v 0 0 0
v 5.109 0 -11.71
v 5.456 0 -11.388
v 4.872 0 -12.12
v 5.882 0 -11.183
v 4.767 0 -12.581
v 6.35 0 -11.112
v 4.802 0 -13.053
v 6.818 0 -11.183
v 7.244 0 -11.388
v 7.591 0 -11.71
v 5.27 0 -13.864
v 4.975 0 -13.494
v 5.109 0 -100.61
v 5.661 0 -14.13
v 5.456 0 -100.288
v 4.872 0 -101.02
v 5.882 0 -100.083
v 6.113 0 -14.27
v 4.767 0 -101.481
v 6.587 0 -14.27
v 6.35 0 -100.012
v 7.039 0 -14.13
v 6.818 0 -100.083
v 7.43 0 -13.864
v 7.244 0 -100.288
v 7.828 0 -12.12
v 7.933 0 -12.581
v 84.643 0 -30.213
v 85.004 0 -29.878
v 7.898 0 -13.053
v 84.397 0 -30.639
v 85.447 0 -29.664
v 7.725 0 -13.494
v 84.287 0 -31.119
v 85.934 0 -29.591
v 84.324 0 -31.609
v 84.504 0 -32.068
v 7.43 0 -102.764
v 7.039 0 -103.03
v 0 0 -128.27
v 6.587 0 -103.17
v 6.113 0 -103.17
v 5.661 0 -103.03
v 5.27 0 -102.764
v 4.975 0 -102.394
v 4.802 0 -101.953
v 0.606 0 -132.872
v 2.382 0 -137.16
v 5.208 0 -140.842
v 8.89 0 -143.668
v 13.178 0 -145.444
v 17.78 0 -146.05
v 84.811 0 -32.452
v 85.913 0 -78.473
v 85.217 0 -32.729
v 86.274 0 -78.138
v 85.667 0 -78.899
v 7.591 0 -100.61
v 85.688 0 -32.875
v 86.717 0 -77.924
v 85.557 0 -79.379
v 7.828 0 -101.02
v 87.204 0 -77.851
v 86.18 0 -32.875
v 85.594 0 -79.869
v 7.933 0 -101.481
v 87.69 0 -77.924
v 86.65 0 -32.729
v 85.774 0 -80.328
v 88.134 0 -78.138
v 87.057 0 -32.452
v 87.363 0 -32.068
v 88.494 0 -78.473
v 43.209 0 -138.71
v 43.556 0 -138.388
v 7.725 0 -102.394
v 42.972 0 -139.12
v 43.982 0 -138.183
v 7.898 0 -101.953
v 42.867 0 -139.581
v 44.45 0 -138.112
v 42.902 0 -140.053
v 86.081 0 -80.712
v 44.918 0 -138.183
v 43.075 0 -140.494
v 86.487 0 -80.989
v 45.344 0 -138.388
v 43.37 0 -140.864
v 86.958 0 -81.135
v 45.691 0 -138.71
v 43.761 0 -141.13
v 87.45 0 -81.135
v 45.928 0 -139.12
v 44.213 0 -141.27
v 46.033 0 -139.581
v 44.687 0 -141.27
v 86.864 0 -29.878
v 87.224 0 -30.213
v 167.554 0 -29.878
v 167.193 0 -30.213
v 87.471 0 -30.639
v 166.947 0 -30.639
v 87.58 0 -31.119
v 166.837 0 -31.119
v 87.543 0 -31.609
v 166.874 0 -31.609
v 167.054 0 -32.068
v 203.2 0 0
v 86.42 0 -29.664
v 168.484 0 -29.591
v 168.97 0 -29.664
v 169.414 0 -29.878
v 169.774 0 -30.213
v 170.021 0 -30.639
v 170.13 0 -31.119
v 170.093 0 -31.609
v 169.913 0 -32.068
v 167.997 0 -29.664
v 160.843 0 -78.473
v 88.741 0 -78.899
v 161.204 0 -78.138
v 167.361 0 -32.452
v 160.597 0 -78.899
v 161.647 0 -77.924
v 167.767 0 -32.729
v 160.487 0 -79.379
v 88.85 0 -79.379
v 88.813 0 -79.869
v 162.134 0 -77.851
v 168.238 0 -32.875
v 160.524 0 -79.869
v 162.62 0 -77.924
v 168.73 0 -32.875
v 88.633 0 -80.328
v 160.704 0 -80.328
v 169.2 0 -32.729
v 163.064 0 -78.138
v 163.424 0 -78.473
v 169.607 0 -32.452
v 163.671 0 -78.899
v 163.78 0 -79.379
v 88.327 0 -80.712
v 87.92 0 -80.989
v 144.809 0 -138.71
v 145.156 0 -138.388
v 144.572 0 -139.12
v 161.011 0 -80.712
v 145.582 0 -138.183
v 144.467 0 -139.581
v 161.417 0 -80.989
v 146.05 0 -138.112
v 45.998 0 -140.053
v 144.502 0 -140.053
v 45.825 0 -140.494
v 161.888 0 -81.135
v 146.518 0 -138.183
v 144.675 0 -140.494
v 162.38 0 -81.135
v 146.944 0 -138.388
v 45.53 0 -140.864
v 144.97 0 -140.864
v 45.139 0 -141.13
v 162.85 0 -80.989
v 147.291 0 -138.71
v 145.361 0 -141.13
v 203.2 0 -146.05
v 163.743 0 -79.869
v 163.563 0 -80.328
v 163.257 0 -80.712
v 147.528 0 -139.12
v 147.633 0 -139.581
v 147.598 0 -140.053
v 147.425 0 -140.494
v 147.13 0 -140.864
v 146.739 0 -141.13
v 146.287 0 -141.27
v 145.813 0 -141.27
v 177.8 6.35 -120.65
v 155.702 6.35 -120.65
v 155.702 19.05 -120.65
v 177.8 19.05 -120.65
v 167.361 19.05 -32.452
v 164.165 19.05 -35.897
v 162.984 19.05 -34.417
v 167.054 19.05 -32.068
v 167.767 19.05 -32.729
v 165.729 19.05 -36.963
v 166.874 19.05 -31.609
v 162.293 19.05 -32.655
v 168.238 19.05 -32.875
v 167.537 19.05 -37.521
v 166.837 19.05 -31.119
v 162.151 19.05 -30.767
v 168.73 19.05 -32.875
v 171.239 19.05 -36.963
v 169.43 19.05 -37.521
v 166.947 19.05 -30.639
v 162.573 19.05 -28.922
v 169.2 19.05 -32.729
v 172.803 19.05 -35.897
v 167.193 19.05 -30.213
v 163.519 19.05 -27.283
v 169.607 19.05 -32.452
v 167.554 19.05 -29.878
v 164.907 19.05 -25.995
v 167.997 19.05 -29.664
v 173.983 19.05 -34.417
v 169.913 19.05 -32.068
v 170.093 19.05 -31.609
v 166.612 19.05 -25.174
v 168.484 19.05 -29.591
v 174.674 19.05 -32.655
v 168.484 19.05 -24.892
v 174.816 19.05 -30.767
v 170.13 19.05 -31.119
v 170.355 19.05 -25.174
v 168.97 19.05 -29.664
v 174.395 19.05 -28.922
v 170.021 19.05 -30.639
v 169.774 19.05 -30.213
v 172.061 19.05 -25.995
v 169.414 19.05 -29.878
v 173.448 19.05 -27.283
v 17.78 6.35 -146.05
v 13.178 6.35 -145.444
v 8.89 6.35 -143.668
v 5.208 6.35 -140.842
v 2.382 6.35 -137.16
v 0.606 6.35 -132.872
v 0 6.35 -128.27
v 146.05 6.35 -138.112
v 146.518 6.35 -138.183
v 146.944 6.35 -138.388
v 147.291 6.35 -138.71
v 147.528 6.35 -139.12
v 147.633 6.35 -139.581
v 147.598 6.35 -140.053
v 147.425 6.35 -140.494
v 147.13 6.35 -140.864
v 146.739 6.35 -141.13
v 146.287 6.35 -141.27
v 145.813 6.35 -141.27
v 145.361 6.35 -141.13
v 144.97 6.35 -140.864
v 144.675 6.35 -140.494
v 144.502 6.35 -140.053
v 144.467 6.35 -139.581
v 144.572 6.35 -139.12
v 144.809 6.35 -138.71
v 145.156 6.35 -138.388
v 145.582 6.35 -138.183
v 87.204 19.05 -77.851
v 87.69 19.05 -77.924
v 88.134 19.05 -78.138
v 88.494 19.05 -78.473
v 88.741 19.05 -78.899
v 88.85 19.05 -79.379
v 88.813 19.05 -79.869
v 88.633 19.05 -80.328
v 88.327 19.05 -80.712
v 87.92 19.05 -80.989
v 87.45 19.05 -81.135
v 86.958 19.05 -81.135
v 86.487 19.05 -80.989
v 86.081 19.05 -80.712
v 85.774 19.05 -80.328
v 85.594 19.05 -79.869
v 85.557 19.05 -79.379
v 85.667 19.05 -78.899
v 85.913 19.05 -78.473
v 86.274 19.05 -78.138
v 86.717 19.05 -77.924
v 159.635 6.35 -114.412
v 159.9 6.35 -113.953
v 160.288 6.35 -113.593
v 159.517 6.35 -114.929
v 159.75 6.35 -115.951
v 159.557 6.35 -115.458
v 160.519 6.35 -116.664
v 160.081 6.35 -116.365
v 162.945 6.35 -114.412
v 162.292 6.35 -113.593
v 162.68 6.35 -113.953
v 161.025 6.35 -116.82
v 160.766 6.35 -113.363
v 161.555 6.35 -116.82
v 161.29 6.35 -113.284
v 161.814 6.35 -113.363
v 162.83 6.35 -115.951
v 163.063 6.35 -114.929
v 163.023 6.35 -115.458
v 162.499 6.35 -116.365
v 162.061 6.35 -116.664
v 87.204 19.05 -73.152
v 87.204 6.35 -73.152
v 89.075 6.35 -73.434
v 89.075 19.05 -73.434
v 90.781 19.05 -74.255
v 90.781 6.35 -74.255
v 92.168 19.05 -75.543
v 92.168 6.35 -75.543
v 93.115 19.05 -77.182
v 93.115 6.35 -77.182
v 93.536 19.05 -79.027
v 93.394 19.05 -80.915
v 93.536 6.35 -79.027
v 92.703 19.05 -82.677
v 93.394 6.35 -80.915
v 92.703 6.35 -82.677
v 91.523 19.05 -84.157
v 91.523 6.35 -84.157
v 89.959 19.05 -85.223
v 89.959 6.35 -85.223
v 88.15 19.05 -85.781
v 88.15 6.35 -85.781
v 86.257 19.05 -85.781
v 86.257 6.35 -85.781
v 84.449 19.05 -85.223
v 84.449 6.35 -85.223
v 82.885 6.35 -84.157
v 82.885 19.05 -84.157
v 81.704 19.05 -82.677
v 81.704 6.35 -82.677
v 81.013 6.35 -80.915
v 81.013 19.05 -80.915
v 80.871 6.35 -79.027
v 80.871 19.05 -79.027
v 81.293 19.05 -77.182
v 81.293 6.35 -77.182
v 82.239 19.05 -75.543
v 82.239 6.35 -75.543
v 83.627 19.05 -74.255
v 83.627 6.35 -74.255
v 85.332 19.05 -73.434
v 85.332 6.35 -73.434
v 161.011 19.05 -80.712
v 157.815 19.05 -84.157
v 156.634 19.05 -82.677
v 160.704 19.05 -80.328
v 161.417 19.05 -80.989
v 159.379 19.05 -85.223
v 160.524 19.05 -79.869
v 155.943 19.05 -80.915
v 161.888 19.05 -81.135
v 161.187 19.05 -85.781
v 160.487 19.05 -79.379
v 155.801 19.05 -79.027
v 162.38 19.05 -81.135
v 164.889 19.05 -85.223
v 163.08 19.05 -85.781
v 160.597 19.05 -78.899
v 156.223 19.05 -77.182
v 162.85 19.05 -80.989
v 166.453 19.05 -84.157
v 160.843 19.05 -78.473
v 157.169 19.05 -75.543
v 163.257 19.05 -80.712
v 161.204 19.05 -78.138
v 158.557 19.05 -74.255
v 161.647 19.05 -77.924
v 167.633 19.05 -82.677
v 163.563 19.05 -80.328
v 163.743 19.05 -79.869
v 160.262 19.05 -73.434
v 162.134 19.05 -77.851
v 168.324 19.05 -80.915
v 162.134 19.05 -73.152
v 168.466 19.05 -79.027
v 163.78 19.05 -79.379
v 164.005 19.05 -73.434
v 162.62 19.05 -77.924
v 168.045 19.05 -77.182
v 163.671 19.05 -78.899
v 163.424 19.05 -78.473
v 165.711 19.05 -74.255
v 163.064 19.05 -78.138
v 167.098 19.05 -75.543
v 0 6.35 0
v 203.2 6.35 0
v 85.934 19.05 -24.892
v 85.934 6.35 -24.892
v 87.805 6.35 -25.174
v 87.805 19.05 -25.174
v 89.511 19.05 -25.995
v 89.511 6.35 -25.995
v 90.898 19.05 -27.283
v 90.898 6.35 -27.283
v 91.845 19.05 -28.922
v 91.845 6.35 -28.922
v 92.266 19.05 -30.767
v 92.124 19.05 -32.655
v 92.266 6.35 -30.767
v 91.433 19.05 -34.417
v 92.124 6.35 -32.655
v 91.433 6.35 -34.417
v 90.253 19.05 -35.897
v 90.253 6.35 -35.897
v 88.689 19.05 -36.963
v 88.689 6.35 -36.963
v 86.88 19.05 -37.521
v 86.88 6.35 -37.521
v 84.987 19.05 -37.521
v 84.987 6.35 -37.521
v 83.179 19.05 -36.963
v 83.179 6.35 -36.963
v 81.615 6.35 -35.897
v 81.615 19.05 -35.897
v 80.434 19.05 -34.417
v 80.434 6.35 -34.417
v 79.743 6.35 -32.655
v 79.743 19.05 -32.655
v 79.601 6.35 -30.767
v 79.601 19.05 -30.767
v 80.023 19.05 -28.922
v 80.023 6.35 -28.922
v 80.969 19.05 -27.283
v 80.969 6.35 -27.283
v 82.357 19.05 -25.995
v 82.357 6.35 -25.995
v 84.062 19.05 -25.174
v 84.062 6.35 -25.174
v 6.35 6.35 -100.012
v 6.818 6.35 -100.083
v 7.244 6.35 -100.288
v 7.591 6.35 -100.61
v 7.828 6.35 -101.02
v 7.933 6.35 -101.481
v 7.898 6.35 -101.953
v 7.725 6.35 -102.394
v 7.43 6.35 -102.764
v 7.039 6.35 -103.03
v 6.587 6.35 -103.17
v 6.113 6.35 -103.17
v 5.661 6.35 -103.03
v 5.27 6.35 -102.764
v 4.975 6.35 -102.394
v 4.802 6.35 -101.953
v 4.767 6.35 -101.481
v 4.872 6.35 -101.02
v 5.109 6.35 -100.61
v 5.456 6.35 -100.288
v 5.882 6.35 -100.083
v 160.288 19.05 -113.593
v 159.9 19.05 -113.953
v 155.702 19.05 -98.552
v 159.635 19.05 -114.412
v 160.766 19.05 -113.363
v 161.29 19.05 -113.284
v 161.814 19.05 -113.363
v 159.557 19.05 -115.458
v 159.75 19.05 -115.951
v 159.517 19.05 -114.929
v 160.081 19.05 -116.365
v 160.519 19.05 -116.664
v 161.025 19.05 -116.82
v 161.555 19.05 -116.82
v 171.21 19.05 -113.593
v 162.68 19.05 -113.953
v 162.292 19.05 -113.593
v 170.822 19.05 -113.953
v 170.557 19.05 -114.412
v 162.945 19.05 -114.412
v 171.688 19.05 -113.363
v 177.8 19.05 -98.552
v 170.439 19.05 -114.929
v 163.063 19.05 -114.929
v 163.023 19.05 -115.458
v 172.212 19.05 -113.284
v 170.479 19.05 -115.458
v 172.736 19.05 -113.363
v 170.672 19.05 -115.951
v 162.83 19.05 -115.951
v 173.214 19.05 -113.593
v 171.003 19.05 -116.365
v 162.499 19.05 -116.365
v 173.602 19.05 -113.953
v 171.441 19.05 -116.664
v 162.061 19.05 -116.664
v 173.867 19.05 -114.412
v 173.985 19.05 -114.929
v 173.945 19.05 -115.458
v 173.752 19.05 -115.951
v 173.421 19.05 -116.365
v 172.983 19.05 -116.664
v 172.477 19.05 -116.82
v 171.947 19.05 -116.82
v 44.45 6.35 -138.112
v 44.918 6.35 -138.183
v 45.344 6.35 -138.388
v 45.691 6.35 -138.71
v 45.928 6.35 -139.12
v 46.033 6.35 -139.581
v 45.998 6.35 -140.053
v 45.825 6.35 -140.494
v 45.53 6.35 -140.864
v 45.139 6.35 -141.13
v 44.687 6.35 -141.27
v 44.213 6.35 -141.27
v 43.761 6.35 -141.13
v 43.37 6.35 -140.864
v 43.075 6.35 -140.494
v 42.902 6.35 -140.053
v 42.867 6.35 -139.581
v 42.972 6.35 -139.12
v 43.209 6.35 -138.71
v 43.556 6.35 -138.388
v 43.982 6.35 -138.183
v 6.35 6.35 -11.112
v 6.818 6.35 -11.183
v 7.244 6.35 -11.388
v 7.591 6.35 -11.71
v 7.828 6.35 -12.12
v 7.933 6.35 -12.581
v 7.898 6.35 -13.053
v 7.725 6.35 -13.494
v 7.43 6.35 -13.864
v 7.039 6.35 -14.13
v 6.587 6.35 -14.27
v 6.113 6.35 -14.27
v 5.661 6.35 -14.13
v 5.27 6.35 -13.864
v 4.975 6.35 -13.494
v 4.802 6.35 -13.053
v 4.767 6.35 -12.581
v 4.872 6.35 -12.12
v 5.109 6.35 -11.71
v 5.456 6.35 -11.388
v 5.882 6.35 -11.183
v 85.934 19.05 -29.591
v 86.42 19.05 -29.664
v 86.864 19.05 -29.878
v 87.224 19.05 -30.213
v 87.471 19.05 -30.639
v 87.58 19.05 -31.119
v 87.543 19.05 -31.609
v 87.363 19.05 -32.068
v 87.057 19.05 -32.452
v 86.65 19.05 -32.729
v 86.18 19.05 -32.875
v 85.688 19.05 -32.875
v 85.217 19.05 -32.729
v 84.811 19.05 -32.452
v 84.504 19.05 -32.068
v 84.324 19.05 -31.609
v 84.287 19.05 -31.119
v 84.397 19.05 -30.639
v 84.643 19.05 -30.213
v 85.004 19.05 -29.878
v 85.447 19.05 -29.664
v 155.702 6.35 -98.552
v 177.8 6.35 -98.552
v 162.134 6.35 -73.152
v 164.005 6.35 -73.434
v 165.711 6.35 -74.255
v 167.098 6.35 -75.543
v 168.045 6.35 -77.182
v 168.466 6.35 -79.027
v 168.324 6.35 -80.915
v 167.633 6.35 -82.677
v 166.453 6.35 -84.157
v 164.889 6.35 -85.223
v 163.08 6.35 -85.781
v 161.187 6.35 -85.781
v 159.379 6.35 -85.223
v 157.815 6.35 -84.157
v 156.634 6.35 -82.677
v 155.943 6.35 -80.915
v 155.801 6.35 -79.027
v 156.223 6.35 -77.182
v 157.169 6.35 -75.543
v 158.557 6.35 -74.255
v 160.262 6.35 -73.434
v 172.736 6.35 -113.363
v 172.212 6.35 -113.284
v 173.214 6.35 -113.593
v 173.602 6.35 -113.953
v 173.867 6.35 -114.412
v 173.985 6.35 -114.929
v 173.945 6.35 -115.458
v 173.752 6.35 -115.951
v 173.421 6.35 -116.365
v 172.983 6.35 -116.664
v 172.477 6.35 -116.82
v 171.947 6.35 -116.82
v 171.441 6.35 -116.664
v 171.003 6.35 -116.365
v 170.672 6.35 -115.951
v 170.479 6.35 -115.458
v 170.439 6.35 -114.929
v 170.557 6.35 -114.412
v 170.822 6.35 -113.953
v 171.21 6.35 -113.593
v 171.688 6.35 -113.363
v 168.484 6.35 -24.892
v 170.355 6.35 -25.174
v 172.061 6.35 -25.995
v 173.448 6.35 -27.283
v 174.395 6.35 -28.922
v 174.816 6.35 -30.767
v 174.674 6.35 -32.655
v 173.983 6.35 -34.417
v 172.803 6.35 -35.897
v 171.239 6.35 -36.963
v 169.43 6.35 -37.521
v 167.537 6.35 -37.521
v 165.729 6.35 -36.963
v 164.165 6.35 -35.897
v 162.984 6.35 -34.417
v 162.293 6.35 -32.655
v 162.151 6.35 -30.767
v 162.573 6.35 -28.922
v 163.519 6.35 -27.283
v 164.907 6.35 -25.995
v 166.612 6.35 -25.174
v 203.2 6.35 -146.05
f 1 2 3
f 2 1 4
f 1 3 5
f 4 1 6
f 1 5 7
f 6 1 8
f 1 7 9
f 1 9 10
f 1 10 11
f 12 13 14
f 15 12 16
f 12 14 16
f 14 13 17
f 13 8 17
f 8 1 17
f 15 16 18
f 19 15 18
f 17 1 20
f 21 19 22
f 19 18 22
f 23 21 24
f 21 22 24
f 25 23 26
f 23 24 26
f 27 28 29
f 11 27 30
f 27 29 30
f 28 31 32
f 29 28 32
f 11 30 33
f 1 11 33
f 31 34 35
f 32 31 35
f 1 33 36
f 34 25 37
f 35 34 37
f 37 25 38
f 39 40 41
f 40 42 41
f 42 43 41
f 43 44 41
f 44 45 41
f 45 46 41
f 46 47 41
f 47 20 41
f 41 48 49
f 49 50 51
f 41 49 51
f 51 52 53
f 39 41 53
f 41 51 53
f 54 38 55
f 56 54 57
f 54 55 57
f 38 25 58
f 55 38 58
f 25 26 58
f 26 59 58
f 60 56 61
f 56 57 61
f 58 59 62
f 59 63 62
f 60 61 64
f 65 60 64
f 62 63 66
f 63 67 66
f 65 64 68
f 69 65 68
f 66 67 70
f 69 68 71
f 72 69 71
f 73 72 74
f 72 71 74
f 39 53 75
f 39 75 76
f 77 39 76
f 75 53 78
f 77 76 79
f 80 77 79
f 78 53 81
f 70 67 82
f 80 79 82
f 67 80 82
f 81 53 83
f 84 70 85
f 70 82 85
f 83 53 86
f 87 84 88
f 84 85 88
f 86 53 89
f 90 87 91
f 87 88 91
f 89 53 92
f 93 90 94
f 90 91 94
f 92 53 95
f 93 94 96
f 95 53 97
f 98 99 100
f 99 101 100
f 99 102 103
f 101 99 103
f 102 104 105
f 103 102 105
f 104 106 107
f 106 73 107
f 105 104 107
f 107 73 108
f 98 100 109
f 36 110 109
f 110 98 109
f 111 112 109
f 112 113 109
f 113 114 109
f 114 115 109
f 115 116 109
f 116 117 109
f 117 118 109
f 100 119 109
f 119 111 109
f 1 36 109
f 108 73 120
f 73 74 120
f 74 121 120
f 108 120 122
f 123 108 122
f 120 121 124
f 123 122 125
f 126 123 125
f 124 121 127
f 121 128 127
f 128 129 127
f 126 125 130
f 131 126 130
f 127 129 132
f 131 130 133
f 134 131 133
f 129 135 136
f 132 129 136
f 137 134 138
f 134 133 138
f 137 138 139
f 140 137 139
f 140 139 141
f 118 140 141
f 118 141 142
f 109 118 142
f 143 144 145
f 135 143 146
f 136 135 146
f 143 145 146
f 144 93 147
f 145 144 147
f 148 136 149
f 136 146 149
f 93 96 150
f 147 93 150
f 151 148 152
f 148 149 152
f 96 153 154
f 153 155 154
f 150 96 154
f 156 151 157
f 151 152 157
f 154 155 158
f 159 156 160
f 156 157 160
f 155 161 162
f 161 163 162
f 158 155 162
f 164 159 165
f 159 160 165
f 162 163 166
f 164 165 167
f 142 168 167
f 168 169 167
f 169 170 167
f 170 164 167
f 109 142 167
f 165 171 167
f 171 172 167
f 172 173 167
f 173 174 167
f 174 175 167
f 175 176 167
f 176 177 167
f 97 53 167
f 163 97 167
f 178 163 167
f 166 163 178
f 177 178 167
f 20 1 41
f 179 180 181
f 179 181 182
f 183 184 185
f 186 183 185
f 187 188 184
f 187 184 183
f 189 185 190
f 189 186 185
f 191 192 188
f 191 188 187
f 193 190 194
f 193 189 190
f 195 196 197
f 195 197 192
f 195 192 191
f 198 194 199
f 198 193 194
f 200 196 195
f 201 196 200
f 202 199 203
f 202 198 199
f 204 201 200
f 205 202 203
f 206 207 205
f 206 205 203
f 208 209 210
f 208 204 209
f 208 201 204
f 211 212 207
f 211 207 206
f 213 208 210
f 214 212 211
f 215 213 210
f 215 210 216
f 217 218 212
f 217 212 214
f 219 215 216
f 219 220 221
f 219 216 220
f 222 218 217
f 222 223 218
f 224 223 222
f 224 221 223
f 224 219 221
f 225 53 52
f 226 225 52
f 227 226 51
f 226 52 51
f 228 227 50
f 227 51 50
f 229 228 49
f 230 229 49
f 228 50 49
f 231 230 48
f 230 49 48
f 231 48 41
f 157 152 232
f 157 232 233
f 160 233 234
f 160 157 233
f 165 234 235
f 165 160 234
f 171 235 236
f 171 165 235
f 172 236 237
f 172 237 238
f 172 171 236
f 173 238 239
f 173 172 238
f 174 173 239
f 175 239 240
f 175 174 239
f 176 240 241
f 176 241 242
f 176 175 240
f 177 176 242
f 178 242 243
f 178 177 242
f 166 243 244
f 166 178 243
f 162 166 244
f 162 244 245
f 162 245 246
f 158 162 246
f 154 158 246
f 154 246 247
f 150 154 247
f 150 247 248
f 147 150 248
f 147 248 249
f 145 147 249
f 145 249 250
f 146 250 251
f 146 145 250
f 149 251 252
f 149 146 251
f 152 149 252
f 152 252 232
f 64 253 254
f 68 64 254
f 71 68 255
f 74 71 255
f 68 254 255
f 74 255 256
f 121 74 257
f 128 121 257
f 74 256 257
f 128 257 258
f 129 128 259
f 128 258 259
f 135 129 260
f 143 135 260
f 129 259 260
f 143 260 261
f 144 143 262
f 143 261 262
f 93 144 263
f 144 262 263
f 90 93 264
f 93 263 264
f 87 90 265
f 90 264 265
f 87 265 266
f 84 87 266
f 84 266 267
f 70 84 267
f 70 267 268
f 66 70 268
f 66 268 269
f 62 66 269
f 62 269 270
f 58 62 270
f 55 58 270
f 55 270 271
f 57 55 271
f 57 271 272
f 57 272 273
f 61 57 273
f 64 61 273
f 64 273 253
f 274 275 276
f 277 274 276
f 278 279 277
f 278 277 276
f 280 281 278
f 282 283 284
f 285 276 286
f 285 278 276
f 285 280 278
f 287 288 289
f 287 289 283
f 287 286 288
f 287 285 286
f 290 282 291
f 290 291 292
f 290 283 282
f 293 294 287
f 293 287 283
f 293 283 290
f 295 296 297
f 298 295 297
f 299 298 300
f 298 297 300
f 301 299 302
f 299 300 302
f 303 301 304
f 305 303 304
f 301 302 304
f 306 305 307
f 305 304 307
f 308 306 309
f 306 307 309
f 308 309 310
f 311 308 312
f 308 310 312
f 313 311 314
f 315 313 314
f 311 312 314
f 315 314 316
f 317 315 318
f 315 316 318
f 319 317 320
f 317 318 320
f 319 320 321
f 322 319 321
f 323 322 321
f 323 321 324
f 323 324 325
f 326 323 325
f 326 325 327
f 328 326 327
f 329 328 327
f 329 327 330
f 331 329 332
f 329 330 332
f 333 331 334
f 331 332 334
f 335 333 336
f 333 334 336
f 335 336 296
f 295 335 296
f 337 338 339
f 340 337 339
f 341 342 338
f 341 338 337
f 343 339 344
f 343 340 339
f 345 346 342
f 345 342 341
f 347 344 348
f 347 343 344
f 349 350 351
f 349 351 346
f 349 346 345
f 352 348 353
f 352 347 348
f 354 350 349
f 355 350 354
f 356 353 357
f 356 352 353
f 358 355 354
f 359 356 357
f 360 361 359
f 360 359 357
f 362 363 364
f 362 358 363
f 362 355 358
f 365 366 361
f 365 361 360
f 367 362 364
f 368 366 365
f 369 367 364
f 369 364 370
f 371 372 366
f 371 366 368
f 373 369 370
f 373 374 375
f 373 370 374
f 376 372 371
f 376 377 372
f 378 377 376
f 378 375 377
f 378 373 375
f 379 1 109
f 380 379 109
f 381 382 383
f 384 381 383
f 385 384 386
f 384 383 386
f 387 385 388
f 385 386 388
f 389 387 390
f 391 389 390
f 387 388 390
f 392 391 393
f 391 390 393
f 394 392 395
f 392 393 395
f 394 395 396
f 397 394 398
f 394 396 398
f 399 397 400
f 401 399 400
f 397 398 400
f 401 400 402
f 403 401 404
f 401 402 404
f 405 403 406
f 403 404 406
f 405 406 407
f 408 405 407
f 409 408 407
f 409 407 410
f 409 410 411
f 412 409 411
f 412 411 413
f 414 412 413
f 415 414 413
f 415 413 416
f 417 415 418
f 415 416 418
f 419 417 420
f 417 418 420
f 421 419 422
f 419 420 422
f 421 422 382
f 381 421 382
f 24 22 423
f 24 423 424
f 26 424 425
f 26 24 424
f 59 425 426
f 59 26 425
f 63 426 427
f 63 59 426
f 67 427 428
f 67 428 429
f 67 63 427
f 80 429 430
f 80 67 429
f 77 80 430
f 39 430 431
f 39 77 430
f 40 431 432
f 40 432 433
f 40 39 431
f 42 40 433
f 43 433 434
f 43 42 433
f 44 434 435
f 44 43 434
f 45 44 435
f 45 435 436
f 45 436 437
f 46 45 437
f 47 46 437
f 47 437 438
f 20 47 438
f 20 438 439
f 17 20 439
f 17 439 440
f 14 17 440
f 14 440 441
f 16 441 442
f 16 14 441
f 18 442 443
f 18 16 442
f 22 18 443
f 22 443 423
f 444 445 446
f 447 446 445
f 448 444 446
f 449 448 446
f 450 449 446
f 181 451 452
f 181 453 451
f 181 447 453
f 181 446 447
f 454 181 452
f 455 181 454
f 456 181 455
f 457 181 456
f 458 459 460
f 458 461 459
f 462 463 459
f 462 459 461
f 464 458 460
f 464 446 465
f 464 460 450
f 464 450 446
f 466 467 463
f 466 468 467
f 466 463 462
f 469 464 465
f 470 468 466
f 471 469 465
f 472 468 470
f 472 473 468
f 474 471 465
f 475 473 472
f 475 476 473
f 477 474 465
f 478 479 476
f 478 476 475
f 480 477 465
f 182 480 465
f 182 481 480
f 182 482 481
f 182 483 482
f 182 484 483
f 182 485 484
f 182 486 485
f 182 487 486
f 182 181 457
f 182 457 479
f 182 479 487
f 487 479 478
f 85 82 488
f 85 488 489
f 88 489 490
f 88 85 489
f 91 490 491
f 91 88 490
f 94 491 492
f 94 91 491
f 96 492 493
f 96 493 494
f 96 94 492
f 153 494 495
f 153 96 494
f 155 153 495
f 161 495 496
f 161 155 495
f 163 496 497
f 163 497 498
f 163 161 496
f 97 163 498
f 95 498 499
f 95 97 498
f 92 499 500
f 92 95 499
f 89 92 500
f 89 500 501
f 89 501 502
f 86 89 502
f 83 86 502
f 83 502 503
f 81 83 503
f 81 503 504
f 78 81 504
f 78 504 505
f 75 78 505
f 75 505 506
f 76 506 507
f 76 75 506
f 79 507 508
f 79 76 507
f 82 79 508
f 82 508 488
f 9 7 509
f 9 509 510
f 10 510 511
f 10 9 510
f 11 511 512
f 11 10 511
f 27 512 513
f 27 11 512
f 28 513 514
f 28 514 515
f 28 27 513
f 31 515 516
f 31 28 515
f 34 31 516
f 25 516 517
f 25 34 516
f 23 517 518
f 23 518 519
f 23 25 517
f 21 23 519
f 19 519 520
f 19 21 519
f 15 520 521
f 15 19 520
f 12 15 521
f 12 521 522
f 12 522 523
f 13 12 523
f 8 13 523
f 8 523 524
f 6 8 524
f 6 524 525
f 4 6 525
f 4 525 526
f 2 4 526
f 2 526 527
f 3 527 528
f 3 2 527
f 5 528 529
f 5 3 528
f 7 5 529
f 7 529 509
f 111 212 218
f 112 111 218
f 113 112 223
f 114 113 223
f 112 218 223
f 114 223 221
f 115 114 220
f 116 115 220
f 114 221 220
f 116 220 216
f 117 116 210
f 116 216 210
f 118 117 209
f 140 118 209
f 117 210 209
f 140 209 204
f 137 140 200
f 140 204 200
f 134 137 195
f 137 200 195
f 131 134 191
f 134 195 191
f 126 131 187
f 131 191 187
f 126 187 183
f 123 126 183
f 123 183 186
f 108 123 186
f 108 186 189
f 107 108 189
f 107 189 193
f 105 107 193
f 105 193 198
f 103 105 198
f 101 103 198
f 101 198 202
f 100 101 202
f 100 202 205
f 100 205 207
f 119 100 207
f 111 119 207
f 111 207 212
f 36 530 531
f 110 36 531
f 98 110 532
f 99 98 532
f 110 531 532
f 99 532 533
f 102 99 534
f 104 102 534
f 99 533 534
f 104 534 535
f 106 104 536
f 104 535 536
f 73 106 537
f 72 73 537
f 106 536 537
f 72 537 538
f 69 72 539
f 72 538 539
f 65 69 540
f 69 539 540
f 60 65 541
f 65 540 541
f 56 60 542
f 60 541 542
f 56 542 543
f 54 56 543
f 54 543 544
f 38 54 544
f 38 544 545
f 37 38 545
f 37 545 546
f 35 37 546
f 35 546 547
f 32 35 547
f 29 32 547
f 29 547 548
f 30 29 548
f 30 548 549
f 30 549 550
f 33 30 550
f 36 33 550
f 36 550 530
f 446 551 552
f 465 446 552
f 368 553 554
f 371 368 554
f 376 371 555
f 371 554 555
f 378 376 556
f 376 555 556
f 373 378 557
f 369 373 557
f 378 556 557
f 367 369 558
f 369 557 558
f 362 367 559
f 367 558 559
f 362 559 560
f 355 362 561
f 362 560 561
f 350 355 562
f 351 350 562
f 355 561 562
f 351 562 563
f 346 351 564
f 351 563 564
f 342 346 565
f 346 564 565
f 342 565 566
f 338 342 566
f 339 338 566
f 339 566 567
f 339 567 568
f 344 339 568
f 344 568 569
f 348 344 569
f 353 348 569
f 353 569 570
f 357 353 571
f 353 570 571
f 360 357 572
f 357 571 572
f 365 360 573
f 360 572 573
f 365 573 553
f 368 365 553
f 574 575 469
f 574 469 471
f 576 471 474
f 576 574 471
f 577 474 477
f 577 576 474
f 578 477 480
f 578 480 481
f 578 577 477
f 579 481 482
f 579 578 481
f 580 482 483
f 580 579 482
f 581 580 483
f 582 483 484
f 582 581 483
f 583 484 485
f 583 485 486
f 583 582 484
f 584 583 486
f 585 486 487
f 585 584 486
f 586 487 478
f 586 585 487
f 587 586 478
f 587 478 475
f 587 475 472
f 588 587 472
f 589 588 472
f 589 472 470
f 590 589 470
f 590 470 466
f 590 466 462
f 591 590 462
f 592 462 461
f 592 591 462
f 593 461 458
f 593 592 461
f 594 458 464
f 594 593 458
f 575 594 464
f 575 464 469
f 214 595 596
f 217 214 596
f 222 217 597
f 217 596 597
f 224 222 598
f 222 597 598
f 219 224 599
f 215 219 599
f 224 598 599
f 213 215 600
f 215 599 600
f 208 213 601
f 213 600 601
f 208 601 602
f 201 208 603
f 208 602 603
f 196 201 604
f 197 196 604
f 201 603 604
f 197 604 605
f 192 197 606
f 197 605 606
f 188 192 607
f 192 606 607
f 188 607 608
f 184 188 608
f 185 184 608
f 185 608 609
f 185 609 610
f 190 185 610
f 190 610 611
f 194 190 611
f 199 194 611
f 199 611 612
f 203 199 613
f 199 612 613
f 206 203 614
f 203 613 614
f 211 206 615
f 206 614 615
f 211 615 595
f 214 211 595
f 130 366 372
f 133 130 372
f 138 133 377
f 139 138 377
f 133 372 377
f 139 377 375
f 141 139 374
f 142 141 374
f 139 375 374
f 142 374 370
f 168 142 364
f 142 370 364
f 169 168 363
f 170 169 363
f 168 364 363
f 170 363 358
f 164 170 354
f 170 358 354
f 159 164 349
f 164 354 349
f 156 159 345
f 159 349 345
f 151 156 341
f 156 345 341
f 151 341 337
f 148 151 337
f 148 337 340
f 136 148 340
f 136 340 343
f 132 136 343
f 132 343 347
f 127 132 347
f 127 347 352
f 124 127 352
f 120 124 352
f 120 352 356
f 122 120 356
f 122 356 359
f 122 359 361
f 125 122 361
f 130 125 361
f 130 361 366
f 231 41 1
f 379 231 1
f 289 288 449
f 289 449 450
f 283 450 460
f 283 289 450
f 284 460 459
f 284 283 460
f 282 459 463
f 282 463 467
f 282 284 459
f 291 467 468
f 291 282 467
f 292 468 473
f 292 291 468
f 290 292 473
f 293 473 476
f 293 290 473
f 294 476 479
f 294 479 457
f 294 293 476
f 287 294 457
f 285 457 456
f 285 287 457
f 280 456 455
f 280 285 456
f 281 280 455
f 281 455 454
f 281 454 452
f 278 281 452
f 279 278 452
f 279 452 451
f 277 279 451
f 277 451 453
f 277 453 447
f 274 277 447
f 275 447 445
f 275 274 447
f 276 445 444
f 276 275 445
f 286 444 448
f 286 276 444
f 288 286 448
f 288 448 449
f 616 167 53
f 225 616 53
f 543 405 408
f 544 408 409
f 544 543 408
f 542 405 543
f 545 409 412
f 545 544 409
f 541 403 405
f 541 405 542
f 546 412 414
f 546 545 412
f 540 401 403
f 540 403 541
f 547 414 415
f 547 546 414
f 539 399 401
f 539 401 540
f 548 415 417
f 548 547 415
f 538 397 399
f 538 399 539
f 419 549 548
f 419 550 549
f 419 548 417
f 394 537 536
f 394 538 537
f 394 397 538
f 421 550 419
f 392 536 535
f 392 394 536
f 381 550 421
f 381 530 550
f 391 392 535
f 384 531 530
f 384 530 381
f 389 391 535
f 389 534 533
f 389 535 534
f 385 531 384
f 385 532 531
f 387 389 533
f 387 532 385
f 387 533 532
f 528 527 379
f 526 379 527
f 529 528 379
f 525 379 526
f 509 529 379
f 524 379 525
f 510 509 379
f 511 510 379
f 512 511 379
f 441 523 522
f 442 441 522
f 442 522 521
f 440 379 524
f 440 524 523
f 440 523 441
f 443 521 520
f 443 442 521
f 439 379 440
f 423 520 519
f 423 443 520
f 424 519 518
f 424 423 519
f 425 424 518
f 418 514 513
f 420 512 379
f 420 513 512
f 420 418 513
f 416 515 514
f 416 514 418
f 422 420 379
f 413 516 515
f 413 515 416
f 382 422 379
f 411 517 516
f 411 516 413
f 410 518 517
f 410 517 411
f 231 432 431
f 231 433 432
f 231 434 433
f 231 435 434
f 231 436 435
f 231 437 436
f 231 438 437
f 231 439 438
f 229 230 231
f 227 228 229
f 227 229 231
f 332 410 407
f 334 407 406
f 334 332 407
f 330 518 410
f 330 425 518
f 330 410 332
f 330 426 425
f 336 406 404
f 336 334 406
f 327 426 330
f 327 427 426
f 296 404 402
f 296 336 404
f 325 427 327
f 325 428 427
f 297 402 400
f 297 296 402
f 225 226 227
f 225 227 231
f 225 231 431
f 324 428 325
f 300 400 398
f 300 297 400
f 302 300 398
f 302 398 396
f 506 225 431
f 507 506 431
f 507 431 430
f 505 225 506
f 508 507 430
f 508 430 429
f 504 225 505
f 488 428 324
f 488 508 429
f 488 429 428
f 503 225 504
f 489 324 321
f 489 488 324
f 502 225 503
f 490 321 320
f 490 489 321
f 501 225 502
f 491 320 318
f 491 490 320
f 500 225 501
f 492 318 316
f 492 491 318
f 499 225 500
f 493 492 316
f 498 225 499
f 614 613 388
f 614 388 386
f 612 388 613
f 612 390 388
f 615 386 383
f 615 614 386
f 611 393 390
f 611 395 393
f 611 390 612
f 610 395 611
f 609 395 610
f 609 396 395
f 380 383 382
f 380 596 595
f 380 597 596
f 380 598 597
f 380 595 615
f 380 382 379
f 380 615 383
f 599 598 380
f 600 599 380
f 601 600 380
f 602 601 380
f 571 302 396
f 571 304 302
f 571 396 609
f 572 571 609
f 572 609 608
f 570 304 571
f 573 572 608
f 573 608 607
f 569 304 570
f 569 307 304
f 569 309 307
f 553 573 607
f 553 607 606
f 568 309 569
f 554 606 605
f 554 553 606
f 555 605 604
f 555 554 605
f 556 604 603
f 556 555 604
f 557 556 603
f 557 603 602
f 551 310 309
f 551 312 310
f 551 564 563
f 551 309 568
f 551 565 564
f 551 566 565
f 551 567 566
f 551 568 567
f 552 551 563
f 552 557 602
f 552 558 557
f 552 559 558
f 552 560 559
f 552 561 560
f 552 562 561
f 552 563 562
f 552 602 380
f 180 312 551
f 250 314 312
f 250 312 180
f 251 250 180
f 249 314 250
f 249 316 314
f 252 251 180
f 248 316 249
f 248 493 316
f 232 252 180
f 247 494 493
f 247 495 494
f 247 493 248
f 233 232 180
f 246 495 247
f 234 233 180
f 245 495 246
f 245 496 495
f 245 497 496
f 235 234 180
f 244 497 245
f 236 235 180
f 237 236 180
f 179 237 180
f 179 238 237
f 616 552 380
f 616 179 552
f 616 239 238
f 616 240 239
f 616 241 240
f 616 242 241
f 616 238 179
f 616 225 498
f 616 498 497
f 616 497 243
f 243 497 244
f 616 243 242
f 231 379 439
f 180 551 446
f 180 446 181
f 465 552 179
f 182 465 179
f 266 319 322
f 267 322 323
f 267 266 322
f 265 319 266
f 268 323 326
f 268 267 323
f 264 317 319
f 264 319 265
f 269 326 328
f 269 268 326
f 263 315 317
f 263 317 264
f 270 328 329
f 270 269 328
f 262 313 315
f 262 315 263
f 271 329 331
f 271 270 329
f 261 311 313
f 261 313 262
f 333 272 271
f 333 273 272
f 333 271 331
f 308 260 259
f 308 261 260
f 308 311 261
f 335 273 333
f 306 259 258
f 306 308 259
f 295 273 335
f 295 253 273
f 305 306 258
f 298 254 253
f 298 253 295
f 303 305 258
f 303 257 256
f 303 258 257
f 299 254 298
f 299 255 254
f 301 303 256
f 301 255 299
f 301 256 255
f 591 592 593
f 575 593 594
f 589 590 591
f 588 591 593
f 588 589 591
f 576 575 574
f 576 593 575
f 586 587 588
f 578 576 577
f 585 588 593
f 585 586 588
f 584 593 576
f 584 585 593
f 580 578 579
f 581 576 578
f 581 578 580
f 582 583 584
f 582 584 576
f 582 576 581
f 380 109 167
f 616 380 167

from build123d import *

# Parameters (mm, degrees)
SKETCH1_R           = 1.5875
BOSS_EXTRUDE1_DEPTH = 6.35
SKETCH2_W           = 22.098
SKETCH2_H           = 22.098
SKETCH2_R           = 1.778
BOSS_EXTRUDE2_DEPTH = 12.7
SKETCH3_R           = 6.35
BOSS_EXTRUDE3_DEPTH = 12.7
SKETCH5_R           = 1.651
CUT_EXTRUDE1_DEPTH  = 251.965625136


with BuildPart() as part:
    # Sketch1 → Boss-Extrude1 (new body)
    with BuildSketch(Plane(origin=(0, 0, 0), x_dir=(1, 0, 0), z_dir=(0, 1, 0))):
        with BuildLine():
            Line((0, 0), (203.2, 0))
            Line((203.2, 0), (203.2, 146.05))
            Line((203.2, 146.05), (17.78, 146.05))
            ThreePointArc((17.78, 146.05), (5.207641431, 140.842358569), (0, 128.27))
            Line((0, 128.27), (0, 0))
        make_face()
        with Locations(Location((6.35, 12.7, 0), (0, 0, 270))):
            Circle(SKETCH1_R, mode=Mode.SUBTRACT)
        with Locations(Location((6.35, 101.6, 0), (0, 0, 270))):
            Circle(SKETCH1_R, mode=Mode.SUBTRACT)
        with Locations(Location((44.45, 139.7, 0), (0, 0, 270))):
            Circle(SKETCH1_R, mode=Mode.SUBTRACT)
        with Locations(Location((146.05, 139.7, 0), (0, 0, 270))):
            Circle(SKETCH1_R, mode=Mode.SUBTRACT)
    extrude(amount=BOSS_EXTRUDE1_DEPTH)

    # Sketch2 → Boss-Extrude2 (add)
    with BuildSketch(Plane(origin=(0, 6.35, 0), x_dir=(1, 0, 0), z_dir=(0, 1, 0))):
        with Locations((166.751, 109.601)):
            Rectangle(SKETCH2_W, SKETCH2_H)
        with Locations(Location((172.212, 115.062, 0), (0, 0, 270))):
            Circle(SKETCH2_R, mode=Mode.SUBTRACT)
        with Locations(Location((161.29, 115.062, 0), (0, 0, 270))):
            Circle(SKETCH2_R, mode=Mode.SUBTRACT)
    extrude(amount=BOSS_EXTRUDE2_DEPTH)

    # Sketch3 → Boss-Extrude3 (add)
    with BuildSketch(Plane(origin=(0, 6.35, 0), x_dir=(1, 0, 0), z_dir=(0, 1, 0))):
        with Locations(Location((162.13368637, 79.502, 0), (0, 0, 270))):
            Circle(SKETCH3_R)
        with Locations(Location((168.48368637, 31.242, 0), (0, 0, 270))):
            Circle(SKETCH3_R)
        with Locations(Location((87.20368637, 79.502, 0), (0, 0, 270))):
            Circle(SKETCH3_R)
        with Locations(Location((85.93368637, 31.242, 0), (0, 0, 270))):
            Circle(SKETCH3_R)
    extrude(amount=BOSS_EXTRUDE3_DEPTH)

    # Sketch5 → Cut-Extrude1 (cut, through all)
    with BuildSketch(Plane(origin=(0, 19.05, 0), x_dir=(1, 0, 0), z_dir=(0, 1, 0))):
        with Locations(Location((168.48368637, 31.242, 0), (0, 0, 270))):
            Circle(SKETCH5_R)
        with Locations(Location((162.13368637, 79.502, 0), (0, 0, 270))):
            Circle(SKETCH5_R)
        with Locations(Location((87.20368637, 79.502, 0), (0, 0, 270))):
            Circle(SKETCH5_R)
        with Locations(Location((85.93368637, 31.242, 0), (0, 0, 270))):
            Circle(SKETCH5_R)
    extrude(amount=-CUT_EXTRUDE1_DEPTH, mode=Mode.SUBTRACT)


solid = part.part
